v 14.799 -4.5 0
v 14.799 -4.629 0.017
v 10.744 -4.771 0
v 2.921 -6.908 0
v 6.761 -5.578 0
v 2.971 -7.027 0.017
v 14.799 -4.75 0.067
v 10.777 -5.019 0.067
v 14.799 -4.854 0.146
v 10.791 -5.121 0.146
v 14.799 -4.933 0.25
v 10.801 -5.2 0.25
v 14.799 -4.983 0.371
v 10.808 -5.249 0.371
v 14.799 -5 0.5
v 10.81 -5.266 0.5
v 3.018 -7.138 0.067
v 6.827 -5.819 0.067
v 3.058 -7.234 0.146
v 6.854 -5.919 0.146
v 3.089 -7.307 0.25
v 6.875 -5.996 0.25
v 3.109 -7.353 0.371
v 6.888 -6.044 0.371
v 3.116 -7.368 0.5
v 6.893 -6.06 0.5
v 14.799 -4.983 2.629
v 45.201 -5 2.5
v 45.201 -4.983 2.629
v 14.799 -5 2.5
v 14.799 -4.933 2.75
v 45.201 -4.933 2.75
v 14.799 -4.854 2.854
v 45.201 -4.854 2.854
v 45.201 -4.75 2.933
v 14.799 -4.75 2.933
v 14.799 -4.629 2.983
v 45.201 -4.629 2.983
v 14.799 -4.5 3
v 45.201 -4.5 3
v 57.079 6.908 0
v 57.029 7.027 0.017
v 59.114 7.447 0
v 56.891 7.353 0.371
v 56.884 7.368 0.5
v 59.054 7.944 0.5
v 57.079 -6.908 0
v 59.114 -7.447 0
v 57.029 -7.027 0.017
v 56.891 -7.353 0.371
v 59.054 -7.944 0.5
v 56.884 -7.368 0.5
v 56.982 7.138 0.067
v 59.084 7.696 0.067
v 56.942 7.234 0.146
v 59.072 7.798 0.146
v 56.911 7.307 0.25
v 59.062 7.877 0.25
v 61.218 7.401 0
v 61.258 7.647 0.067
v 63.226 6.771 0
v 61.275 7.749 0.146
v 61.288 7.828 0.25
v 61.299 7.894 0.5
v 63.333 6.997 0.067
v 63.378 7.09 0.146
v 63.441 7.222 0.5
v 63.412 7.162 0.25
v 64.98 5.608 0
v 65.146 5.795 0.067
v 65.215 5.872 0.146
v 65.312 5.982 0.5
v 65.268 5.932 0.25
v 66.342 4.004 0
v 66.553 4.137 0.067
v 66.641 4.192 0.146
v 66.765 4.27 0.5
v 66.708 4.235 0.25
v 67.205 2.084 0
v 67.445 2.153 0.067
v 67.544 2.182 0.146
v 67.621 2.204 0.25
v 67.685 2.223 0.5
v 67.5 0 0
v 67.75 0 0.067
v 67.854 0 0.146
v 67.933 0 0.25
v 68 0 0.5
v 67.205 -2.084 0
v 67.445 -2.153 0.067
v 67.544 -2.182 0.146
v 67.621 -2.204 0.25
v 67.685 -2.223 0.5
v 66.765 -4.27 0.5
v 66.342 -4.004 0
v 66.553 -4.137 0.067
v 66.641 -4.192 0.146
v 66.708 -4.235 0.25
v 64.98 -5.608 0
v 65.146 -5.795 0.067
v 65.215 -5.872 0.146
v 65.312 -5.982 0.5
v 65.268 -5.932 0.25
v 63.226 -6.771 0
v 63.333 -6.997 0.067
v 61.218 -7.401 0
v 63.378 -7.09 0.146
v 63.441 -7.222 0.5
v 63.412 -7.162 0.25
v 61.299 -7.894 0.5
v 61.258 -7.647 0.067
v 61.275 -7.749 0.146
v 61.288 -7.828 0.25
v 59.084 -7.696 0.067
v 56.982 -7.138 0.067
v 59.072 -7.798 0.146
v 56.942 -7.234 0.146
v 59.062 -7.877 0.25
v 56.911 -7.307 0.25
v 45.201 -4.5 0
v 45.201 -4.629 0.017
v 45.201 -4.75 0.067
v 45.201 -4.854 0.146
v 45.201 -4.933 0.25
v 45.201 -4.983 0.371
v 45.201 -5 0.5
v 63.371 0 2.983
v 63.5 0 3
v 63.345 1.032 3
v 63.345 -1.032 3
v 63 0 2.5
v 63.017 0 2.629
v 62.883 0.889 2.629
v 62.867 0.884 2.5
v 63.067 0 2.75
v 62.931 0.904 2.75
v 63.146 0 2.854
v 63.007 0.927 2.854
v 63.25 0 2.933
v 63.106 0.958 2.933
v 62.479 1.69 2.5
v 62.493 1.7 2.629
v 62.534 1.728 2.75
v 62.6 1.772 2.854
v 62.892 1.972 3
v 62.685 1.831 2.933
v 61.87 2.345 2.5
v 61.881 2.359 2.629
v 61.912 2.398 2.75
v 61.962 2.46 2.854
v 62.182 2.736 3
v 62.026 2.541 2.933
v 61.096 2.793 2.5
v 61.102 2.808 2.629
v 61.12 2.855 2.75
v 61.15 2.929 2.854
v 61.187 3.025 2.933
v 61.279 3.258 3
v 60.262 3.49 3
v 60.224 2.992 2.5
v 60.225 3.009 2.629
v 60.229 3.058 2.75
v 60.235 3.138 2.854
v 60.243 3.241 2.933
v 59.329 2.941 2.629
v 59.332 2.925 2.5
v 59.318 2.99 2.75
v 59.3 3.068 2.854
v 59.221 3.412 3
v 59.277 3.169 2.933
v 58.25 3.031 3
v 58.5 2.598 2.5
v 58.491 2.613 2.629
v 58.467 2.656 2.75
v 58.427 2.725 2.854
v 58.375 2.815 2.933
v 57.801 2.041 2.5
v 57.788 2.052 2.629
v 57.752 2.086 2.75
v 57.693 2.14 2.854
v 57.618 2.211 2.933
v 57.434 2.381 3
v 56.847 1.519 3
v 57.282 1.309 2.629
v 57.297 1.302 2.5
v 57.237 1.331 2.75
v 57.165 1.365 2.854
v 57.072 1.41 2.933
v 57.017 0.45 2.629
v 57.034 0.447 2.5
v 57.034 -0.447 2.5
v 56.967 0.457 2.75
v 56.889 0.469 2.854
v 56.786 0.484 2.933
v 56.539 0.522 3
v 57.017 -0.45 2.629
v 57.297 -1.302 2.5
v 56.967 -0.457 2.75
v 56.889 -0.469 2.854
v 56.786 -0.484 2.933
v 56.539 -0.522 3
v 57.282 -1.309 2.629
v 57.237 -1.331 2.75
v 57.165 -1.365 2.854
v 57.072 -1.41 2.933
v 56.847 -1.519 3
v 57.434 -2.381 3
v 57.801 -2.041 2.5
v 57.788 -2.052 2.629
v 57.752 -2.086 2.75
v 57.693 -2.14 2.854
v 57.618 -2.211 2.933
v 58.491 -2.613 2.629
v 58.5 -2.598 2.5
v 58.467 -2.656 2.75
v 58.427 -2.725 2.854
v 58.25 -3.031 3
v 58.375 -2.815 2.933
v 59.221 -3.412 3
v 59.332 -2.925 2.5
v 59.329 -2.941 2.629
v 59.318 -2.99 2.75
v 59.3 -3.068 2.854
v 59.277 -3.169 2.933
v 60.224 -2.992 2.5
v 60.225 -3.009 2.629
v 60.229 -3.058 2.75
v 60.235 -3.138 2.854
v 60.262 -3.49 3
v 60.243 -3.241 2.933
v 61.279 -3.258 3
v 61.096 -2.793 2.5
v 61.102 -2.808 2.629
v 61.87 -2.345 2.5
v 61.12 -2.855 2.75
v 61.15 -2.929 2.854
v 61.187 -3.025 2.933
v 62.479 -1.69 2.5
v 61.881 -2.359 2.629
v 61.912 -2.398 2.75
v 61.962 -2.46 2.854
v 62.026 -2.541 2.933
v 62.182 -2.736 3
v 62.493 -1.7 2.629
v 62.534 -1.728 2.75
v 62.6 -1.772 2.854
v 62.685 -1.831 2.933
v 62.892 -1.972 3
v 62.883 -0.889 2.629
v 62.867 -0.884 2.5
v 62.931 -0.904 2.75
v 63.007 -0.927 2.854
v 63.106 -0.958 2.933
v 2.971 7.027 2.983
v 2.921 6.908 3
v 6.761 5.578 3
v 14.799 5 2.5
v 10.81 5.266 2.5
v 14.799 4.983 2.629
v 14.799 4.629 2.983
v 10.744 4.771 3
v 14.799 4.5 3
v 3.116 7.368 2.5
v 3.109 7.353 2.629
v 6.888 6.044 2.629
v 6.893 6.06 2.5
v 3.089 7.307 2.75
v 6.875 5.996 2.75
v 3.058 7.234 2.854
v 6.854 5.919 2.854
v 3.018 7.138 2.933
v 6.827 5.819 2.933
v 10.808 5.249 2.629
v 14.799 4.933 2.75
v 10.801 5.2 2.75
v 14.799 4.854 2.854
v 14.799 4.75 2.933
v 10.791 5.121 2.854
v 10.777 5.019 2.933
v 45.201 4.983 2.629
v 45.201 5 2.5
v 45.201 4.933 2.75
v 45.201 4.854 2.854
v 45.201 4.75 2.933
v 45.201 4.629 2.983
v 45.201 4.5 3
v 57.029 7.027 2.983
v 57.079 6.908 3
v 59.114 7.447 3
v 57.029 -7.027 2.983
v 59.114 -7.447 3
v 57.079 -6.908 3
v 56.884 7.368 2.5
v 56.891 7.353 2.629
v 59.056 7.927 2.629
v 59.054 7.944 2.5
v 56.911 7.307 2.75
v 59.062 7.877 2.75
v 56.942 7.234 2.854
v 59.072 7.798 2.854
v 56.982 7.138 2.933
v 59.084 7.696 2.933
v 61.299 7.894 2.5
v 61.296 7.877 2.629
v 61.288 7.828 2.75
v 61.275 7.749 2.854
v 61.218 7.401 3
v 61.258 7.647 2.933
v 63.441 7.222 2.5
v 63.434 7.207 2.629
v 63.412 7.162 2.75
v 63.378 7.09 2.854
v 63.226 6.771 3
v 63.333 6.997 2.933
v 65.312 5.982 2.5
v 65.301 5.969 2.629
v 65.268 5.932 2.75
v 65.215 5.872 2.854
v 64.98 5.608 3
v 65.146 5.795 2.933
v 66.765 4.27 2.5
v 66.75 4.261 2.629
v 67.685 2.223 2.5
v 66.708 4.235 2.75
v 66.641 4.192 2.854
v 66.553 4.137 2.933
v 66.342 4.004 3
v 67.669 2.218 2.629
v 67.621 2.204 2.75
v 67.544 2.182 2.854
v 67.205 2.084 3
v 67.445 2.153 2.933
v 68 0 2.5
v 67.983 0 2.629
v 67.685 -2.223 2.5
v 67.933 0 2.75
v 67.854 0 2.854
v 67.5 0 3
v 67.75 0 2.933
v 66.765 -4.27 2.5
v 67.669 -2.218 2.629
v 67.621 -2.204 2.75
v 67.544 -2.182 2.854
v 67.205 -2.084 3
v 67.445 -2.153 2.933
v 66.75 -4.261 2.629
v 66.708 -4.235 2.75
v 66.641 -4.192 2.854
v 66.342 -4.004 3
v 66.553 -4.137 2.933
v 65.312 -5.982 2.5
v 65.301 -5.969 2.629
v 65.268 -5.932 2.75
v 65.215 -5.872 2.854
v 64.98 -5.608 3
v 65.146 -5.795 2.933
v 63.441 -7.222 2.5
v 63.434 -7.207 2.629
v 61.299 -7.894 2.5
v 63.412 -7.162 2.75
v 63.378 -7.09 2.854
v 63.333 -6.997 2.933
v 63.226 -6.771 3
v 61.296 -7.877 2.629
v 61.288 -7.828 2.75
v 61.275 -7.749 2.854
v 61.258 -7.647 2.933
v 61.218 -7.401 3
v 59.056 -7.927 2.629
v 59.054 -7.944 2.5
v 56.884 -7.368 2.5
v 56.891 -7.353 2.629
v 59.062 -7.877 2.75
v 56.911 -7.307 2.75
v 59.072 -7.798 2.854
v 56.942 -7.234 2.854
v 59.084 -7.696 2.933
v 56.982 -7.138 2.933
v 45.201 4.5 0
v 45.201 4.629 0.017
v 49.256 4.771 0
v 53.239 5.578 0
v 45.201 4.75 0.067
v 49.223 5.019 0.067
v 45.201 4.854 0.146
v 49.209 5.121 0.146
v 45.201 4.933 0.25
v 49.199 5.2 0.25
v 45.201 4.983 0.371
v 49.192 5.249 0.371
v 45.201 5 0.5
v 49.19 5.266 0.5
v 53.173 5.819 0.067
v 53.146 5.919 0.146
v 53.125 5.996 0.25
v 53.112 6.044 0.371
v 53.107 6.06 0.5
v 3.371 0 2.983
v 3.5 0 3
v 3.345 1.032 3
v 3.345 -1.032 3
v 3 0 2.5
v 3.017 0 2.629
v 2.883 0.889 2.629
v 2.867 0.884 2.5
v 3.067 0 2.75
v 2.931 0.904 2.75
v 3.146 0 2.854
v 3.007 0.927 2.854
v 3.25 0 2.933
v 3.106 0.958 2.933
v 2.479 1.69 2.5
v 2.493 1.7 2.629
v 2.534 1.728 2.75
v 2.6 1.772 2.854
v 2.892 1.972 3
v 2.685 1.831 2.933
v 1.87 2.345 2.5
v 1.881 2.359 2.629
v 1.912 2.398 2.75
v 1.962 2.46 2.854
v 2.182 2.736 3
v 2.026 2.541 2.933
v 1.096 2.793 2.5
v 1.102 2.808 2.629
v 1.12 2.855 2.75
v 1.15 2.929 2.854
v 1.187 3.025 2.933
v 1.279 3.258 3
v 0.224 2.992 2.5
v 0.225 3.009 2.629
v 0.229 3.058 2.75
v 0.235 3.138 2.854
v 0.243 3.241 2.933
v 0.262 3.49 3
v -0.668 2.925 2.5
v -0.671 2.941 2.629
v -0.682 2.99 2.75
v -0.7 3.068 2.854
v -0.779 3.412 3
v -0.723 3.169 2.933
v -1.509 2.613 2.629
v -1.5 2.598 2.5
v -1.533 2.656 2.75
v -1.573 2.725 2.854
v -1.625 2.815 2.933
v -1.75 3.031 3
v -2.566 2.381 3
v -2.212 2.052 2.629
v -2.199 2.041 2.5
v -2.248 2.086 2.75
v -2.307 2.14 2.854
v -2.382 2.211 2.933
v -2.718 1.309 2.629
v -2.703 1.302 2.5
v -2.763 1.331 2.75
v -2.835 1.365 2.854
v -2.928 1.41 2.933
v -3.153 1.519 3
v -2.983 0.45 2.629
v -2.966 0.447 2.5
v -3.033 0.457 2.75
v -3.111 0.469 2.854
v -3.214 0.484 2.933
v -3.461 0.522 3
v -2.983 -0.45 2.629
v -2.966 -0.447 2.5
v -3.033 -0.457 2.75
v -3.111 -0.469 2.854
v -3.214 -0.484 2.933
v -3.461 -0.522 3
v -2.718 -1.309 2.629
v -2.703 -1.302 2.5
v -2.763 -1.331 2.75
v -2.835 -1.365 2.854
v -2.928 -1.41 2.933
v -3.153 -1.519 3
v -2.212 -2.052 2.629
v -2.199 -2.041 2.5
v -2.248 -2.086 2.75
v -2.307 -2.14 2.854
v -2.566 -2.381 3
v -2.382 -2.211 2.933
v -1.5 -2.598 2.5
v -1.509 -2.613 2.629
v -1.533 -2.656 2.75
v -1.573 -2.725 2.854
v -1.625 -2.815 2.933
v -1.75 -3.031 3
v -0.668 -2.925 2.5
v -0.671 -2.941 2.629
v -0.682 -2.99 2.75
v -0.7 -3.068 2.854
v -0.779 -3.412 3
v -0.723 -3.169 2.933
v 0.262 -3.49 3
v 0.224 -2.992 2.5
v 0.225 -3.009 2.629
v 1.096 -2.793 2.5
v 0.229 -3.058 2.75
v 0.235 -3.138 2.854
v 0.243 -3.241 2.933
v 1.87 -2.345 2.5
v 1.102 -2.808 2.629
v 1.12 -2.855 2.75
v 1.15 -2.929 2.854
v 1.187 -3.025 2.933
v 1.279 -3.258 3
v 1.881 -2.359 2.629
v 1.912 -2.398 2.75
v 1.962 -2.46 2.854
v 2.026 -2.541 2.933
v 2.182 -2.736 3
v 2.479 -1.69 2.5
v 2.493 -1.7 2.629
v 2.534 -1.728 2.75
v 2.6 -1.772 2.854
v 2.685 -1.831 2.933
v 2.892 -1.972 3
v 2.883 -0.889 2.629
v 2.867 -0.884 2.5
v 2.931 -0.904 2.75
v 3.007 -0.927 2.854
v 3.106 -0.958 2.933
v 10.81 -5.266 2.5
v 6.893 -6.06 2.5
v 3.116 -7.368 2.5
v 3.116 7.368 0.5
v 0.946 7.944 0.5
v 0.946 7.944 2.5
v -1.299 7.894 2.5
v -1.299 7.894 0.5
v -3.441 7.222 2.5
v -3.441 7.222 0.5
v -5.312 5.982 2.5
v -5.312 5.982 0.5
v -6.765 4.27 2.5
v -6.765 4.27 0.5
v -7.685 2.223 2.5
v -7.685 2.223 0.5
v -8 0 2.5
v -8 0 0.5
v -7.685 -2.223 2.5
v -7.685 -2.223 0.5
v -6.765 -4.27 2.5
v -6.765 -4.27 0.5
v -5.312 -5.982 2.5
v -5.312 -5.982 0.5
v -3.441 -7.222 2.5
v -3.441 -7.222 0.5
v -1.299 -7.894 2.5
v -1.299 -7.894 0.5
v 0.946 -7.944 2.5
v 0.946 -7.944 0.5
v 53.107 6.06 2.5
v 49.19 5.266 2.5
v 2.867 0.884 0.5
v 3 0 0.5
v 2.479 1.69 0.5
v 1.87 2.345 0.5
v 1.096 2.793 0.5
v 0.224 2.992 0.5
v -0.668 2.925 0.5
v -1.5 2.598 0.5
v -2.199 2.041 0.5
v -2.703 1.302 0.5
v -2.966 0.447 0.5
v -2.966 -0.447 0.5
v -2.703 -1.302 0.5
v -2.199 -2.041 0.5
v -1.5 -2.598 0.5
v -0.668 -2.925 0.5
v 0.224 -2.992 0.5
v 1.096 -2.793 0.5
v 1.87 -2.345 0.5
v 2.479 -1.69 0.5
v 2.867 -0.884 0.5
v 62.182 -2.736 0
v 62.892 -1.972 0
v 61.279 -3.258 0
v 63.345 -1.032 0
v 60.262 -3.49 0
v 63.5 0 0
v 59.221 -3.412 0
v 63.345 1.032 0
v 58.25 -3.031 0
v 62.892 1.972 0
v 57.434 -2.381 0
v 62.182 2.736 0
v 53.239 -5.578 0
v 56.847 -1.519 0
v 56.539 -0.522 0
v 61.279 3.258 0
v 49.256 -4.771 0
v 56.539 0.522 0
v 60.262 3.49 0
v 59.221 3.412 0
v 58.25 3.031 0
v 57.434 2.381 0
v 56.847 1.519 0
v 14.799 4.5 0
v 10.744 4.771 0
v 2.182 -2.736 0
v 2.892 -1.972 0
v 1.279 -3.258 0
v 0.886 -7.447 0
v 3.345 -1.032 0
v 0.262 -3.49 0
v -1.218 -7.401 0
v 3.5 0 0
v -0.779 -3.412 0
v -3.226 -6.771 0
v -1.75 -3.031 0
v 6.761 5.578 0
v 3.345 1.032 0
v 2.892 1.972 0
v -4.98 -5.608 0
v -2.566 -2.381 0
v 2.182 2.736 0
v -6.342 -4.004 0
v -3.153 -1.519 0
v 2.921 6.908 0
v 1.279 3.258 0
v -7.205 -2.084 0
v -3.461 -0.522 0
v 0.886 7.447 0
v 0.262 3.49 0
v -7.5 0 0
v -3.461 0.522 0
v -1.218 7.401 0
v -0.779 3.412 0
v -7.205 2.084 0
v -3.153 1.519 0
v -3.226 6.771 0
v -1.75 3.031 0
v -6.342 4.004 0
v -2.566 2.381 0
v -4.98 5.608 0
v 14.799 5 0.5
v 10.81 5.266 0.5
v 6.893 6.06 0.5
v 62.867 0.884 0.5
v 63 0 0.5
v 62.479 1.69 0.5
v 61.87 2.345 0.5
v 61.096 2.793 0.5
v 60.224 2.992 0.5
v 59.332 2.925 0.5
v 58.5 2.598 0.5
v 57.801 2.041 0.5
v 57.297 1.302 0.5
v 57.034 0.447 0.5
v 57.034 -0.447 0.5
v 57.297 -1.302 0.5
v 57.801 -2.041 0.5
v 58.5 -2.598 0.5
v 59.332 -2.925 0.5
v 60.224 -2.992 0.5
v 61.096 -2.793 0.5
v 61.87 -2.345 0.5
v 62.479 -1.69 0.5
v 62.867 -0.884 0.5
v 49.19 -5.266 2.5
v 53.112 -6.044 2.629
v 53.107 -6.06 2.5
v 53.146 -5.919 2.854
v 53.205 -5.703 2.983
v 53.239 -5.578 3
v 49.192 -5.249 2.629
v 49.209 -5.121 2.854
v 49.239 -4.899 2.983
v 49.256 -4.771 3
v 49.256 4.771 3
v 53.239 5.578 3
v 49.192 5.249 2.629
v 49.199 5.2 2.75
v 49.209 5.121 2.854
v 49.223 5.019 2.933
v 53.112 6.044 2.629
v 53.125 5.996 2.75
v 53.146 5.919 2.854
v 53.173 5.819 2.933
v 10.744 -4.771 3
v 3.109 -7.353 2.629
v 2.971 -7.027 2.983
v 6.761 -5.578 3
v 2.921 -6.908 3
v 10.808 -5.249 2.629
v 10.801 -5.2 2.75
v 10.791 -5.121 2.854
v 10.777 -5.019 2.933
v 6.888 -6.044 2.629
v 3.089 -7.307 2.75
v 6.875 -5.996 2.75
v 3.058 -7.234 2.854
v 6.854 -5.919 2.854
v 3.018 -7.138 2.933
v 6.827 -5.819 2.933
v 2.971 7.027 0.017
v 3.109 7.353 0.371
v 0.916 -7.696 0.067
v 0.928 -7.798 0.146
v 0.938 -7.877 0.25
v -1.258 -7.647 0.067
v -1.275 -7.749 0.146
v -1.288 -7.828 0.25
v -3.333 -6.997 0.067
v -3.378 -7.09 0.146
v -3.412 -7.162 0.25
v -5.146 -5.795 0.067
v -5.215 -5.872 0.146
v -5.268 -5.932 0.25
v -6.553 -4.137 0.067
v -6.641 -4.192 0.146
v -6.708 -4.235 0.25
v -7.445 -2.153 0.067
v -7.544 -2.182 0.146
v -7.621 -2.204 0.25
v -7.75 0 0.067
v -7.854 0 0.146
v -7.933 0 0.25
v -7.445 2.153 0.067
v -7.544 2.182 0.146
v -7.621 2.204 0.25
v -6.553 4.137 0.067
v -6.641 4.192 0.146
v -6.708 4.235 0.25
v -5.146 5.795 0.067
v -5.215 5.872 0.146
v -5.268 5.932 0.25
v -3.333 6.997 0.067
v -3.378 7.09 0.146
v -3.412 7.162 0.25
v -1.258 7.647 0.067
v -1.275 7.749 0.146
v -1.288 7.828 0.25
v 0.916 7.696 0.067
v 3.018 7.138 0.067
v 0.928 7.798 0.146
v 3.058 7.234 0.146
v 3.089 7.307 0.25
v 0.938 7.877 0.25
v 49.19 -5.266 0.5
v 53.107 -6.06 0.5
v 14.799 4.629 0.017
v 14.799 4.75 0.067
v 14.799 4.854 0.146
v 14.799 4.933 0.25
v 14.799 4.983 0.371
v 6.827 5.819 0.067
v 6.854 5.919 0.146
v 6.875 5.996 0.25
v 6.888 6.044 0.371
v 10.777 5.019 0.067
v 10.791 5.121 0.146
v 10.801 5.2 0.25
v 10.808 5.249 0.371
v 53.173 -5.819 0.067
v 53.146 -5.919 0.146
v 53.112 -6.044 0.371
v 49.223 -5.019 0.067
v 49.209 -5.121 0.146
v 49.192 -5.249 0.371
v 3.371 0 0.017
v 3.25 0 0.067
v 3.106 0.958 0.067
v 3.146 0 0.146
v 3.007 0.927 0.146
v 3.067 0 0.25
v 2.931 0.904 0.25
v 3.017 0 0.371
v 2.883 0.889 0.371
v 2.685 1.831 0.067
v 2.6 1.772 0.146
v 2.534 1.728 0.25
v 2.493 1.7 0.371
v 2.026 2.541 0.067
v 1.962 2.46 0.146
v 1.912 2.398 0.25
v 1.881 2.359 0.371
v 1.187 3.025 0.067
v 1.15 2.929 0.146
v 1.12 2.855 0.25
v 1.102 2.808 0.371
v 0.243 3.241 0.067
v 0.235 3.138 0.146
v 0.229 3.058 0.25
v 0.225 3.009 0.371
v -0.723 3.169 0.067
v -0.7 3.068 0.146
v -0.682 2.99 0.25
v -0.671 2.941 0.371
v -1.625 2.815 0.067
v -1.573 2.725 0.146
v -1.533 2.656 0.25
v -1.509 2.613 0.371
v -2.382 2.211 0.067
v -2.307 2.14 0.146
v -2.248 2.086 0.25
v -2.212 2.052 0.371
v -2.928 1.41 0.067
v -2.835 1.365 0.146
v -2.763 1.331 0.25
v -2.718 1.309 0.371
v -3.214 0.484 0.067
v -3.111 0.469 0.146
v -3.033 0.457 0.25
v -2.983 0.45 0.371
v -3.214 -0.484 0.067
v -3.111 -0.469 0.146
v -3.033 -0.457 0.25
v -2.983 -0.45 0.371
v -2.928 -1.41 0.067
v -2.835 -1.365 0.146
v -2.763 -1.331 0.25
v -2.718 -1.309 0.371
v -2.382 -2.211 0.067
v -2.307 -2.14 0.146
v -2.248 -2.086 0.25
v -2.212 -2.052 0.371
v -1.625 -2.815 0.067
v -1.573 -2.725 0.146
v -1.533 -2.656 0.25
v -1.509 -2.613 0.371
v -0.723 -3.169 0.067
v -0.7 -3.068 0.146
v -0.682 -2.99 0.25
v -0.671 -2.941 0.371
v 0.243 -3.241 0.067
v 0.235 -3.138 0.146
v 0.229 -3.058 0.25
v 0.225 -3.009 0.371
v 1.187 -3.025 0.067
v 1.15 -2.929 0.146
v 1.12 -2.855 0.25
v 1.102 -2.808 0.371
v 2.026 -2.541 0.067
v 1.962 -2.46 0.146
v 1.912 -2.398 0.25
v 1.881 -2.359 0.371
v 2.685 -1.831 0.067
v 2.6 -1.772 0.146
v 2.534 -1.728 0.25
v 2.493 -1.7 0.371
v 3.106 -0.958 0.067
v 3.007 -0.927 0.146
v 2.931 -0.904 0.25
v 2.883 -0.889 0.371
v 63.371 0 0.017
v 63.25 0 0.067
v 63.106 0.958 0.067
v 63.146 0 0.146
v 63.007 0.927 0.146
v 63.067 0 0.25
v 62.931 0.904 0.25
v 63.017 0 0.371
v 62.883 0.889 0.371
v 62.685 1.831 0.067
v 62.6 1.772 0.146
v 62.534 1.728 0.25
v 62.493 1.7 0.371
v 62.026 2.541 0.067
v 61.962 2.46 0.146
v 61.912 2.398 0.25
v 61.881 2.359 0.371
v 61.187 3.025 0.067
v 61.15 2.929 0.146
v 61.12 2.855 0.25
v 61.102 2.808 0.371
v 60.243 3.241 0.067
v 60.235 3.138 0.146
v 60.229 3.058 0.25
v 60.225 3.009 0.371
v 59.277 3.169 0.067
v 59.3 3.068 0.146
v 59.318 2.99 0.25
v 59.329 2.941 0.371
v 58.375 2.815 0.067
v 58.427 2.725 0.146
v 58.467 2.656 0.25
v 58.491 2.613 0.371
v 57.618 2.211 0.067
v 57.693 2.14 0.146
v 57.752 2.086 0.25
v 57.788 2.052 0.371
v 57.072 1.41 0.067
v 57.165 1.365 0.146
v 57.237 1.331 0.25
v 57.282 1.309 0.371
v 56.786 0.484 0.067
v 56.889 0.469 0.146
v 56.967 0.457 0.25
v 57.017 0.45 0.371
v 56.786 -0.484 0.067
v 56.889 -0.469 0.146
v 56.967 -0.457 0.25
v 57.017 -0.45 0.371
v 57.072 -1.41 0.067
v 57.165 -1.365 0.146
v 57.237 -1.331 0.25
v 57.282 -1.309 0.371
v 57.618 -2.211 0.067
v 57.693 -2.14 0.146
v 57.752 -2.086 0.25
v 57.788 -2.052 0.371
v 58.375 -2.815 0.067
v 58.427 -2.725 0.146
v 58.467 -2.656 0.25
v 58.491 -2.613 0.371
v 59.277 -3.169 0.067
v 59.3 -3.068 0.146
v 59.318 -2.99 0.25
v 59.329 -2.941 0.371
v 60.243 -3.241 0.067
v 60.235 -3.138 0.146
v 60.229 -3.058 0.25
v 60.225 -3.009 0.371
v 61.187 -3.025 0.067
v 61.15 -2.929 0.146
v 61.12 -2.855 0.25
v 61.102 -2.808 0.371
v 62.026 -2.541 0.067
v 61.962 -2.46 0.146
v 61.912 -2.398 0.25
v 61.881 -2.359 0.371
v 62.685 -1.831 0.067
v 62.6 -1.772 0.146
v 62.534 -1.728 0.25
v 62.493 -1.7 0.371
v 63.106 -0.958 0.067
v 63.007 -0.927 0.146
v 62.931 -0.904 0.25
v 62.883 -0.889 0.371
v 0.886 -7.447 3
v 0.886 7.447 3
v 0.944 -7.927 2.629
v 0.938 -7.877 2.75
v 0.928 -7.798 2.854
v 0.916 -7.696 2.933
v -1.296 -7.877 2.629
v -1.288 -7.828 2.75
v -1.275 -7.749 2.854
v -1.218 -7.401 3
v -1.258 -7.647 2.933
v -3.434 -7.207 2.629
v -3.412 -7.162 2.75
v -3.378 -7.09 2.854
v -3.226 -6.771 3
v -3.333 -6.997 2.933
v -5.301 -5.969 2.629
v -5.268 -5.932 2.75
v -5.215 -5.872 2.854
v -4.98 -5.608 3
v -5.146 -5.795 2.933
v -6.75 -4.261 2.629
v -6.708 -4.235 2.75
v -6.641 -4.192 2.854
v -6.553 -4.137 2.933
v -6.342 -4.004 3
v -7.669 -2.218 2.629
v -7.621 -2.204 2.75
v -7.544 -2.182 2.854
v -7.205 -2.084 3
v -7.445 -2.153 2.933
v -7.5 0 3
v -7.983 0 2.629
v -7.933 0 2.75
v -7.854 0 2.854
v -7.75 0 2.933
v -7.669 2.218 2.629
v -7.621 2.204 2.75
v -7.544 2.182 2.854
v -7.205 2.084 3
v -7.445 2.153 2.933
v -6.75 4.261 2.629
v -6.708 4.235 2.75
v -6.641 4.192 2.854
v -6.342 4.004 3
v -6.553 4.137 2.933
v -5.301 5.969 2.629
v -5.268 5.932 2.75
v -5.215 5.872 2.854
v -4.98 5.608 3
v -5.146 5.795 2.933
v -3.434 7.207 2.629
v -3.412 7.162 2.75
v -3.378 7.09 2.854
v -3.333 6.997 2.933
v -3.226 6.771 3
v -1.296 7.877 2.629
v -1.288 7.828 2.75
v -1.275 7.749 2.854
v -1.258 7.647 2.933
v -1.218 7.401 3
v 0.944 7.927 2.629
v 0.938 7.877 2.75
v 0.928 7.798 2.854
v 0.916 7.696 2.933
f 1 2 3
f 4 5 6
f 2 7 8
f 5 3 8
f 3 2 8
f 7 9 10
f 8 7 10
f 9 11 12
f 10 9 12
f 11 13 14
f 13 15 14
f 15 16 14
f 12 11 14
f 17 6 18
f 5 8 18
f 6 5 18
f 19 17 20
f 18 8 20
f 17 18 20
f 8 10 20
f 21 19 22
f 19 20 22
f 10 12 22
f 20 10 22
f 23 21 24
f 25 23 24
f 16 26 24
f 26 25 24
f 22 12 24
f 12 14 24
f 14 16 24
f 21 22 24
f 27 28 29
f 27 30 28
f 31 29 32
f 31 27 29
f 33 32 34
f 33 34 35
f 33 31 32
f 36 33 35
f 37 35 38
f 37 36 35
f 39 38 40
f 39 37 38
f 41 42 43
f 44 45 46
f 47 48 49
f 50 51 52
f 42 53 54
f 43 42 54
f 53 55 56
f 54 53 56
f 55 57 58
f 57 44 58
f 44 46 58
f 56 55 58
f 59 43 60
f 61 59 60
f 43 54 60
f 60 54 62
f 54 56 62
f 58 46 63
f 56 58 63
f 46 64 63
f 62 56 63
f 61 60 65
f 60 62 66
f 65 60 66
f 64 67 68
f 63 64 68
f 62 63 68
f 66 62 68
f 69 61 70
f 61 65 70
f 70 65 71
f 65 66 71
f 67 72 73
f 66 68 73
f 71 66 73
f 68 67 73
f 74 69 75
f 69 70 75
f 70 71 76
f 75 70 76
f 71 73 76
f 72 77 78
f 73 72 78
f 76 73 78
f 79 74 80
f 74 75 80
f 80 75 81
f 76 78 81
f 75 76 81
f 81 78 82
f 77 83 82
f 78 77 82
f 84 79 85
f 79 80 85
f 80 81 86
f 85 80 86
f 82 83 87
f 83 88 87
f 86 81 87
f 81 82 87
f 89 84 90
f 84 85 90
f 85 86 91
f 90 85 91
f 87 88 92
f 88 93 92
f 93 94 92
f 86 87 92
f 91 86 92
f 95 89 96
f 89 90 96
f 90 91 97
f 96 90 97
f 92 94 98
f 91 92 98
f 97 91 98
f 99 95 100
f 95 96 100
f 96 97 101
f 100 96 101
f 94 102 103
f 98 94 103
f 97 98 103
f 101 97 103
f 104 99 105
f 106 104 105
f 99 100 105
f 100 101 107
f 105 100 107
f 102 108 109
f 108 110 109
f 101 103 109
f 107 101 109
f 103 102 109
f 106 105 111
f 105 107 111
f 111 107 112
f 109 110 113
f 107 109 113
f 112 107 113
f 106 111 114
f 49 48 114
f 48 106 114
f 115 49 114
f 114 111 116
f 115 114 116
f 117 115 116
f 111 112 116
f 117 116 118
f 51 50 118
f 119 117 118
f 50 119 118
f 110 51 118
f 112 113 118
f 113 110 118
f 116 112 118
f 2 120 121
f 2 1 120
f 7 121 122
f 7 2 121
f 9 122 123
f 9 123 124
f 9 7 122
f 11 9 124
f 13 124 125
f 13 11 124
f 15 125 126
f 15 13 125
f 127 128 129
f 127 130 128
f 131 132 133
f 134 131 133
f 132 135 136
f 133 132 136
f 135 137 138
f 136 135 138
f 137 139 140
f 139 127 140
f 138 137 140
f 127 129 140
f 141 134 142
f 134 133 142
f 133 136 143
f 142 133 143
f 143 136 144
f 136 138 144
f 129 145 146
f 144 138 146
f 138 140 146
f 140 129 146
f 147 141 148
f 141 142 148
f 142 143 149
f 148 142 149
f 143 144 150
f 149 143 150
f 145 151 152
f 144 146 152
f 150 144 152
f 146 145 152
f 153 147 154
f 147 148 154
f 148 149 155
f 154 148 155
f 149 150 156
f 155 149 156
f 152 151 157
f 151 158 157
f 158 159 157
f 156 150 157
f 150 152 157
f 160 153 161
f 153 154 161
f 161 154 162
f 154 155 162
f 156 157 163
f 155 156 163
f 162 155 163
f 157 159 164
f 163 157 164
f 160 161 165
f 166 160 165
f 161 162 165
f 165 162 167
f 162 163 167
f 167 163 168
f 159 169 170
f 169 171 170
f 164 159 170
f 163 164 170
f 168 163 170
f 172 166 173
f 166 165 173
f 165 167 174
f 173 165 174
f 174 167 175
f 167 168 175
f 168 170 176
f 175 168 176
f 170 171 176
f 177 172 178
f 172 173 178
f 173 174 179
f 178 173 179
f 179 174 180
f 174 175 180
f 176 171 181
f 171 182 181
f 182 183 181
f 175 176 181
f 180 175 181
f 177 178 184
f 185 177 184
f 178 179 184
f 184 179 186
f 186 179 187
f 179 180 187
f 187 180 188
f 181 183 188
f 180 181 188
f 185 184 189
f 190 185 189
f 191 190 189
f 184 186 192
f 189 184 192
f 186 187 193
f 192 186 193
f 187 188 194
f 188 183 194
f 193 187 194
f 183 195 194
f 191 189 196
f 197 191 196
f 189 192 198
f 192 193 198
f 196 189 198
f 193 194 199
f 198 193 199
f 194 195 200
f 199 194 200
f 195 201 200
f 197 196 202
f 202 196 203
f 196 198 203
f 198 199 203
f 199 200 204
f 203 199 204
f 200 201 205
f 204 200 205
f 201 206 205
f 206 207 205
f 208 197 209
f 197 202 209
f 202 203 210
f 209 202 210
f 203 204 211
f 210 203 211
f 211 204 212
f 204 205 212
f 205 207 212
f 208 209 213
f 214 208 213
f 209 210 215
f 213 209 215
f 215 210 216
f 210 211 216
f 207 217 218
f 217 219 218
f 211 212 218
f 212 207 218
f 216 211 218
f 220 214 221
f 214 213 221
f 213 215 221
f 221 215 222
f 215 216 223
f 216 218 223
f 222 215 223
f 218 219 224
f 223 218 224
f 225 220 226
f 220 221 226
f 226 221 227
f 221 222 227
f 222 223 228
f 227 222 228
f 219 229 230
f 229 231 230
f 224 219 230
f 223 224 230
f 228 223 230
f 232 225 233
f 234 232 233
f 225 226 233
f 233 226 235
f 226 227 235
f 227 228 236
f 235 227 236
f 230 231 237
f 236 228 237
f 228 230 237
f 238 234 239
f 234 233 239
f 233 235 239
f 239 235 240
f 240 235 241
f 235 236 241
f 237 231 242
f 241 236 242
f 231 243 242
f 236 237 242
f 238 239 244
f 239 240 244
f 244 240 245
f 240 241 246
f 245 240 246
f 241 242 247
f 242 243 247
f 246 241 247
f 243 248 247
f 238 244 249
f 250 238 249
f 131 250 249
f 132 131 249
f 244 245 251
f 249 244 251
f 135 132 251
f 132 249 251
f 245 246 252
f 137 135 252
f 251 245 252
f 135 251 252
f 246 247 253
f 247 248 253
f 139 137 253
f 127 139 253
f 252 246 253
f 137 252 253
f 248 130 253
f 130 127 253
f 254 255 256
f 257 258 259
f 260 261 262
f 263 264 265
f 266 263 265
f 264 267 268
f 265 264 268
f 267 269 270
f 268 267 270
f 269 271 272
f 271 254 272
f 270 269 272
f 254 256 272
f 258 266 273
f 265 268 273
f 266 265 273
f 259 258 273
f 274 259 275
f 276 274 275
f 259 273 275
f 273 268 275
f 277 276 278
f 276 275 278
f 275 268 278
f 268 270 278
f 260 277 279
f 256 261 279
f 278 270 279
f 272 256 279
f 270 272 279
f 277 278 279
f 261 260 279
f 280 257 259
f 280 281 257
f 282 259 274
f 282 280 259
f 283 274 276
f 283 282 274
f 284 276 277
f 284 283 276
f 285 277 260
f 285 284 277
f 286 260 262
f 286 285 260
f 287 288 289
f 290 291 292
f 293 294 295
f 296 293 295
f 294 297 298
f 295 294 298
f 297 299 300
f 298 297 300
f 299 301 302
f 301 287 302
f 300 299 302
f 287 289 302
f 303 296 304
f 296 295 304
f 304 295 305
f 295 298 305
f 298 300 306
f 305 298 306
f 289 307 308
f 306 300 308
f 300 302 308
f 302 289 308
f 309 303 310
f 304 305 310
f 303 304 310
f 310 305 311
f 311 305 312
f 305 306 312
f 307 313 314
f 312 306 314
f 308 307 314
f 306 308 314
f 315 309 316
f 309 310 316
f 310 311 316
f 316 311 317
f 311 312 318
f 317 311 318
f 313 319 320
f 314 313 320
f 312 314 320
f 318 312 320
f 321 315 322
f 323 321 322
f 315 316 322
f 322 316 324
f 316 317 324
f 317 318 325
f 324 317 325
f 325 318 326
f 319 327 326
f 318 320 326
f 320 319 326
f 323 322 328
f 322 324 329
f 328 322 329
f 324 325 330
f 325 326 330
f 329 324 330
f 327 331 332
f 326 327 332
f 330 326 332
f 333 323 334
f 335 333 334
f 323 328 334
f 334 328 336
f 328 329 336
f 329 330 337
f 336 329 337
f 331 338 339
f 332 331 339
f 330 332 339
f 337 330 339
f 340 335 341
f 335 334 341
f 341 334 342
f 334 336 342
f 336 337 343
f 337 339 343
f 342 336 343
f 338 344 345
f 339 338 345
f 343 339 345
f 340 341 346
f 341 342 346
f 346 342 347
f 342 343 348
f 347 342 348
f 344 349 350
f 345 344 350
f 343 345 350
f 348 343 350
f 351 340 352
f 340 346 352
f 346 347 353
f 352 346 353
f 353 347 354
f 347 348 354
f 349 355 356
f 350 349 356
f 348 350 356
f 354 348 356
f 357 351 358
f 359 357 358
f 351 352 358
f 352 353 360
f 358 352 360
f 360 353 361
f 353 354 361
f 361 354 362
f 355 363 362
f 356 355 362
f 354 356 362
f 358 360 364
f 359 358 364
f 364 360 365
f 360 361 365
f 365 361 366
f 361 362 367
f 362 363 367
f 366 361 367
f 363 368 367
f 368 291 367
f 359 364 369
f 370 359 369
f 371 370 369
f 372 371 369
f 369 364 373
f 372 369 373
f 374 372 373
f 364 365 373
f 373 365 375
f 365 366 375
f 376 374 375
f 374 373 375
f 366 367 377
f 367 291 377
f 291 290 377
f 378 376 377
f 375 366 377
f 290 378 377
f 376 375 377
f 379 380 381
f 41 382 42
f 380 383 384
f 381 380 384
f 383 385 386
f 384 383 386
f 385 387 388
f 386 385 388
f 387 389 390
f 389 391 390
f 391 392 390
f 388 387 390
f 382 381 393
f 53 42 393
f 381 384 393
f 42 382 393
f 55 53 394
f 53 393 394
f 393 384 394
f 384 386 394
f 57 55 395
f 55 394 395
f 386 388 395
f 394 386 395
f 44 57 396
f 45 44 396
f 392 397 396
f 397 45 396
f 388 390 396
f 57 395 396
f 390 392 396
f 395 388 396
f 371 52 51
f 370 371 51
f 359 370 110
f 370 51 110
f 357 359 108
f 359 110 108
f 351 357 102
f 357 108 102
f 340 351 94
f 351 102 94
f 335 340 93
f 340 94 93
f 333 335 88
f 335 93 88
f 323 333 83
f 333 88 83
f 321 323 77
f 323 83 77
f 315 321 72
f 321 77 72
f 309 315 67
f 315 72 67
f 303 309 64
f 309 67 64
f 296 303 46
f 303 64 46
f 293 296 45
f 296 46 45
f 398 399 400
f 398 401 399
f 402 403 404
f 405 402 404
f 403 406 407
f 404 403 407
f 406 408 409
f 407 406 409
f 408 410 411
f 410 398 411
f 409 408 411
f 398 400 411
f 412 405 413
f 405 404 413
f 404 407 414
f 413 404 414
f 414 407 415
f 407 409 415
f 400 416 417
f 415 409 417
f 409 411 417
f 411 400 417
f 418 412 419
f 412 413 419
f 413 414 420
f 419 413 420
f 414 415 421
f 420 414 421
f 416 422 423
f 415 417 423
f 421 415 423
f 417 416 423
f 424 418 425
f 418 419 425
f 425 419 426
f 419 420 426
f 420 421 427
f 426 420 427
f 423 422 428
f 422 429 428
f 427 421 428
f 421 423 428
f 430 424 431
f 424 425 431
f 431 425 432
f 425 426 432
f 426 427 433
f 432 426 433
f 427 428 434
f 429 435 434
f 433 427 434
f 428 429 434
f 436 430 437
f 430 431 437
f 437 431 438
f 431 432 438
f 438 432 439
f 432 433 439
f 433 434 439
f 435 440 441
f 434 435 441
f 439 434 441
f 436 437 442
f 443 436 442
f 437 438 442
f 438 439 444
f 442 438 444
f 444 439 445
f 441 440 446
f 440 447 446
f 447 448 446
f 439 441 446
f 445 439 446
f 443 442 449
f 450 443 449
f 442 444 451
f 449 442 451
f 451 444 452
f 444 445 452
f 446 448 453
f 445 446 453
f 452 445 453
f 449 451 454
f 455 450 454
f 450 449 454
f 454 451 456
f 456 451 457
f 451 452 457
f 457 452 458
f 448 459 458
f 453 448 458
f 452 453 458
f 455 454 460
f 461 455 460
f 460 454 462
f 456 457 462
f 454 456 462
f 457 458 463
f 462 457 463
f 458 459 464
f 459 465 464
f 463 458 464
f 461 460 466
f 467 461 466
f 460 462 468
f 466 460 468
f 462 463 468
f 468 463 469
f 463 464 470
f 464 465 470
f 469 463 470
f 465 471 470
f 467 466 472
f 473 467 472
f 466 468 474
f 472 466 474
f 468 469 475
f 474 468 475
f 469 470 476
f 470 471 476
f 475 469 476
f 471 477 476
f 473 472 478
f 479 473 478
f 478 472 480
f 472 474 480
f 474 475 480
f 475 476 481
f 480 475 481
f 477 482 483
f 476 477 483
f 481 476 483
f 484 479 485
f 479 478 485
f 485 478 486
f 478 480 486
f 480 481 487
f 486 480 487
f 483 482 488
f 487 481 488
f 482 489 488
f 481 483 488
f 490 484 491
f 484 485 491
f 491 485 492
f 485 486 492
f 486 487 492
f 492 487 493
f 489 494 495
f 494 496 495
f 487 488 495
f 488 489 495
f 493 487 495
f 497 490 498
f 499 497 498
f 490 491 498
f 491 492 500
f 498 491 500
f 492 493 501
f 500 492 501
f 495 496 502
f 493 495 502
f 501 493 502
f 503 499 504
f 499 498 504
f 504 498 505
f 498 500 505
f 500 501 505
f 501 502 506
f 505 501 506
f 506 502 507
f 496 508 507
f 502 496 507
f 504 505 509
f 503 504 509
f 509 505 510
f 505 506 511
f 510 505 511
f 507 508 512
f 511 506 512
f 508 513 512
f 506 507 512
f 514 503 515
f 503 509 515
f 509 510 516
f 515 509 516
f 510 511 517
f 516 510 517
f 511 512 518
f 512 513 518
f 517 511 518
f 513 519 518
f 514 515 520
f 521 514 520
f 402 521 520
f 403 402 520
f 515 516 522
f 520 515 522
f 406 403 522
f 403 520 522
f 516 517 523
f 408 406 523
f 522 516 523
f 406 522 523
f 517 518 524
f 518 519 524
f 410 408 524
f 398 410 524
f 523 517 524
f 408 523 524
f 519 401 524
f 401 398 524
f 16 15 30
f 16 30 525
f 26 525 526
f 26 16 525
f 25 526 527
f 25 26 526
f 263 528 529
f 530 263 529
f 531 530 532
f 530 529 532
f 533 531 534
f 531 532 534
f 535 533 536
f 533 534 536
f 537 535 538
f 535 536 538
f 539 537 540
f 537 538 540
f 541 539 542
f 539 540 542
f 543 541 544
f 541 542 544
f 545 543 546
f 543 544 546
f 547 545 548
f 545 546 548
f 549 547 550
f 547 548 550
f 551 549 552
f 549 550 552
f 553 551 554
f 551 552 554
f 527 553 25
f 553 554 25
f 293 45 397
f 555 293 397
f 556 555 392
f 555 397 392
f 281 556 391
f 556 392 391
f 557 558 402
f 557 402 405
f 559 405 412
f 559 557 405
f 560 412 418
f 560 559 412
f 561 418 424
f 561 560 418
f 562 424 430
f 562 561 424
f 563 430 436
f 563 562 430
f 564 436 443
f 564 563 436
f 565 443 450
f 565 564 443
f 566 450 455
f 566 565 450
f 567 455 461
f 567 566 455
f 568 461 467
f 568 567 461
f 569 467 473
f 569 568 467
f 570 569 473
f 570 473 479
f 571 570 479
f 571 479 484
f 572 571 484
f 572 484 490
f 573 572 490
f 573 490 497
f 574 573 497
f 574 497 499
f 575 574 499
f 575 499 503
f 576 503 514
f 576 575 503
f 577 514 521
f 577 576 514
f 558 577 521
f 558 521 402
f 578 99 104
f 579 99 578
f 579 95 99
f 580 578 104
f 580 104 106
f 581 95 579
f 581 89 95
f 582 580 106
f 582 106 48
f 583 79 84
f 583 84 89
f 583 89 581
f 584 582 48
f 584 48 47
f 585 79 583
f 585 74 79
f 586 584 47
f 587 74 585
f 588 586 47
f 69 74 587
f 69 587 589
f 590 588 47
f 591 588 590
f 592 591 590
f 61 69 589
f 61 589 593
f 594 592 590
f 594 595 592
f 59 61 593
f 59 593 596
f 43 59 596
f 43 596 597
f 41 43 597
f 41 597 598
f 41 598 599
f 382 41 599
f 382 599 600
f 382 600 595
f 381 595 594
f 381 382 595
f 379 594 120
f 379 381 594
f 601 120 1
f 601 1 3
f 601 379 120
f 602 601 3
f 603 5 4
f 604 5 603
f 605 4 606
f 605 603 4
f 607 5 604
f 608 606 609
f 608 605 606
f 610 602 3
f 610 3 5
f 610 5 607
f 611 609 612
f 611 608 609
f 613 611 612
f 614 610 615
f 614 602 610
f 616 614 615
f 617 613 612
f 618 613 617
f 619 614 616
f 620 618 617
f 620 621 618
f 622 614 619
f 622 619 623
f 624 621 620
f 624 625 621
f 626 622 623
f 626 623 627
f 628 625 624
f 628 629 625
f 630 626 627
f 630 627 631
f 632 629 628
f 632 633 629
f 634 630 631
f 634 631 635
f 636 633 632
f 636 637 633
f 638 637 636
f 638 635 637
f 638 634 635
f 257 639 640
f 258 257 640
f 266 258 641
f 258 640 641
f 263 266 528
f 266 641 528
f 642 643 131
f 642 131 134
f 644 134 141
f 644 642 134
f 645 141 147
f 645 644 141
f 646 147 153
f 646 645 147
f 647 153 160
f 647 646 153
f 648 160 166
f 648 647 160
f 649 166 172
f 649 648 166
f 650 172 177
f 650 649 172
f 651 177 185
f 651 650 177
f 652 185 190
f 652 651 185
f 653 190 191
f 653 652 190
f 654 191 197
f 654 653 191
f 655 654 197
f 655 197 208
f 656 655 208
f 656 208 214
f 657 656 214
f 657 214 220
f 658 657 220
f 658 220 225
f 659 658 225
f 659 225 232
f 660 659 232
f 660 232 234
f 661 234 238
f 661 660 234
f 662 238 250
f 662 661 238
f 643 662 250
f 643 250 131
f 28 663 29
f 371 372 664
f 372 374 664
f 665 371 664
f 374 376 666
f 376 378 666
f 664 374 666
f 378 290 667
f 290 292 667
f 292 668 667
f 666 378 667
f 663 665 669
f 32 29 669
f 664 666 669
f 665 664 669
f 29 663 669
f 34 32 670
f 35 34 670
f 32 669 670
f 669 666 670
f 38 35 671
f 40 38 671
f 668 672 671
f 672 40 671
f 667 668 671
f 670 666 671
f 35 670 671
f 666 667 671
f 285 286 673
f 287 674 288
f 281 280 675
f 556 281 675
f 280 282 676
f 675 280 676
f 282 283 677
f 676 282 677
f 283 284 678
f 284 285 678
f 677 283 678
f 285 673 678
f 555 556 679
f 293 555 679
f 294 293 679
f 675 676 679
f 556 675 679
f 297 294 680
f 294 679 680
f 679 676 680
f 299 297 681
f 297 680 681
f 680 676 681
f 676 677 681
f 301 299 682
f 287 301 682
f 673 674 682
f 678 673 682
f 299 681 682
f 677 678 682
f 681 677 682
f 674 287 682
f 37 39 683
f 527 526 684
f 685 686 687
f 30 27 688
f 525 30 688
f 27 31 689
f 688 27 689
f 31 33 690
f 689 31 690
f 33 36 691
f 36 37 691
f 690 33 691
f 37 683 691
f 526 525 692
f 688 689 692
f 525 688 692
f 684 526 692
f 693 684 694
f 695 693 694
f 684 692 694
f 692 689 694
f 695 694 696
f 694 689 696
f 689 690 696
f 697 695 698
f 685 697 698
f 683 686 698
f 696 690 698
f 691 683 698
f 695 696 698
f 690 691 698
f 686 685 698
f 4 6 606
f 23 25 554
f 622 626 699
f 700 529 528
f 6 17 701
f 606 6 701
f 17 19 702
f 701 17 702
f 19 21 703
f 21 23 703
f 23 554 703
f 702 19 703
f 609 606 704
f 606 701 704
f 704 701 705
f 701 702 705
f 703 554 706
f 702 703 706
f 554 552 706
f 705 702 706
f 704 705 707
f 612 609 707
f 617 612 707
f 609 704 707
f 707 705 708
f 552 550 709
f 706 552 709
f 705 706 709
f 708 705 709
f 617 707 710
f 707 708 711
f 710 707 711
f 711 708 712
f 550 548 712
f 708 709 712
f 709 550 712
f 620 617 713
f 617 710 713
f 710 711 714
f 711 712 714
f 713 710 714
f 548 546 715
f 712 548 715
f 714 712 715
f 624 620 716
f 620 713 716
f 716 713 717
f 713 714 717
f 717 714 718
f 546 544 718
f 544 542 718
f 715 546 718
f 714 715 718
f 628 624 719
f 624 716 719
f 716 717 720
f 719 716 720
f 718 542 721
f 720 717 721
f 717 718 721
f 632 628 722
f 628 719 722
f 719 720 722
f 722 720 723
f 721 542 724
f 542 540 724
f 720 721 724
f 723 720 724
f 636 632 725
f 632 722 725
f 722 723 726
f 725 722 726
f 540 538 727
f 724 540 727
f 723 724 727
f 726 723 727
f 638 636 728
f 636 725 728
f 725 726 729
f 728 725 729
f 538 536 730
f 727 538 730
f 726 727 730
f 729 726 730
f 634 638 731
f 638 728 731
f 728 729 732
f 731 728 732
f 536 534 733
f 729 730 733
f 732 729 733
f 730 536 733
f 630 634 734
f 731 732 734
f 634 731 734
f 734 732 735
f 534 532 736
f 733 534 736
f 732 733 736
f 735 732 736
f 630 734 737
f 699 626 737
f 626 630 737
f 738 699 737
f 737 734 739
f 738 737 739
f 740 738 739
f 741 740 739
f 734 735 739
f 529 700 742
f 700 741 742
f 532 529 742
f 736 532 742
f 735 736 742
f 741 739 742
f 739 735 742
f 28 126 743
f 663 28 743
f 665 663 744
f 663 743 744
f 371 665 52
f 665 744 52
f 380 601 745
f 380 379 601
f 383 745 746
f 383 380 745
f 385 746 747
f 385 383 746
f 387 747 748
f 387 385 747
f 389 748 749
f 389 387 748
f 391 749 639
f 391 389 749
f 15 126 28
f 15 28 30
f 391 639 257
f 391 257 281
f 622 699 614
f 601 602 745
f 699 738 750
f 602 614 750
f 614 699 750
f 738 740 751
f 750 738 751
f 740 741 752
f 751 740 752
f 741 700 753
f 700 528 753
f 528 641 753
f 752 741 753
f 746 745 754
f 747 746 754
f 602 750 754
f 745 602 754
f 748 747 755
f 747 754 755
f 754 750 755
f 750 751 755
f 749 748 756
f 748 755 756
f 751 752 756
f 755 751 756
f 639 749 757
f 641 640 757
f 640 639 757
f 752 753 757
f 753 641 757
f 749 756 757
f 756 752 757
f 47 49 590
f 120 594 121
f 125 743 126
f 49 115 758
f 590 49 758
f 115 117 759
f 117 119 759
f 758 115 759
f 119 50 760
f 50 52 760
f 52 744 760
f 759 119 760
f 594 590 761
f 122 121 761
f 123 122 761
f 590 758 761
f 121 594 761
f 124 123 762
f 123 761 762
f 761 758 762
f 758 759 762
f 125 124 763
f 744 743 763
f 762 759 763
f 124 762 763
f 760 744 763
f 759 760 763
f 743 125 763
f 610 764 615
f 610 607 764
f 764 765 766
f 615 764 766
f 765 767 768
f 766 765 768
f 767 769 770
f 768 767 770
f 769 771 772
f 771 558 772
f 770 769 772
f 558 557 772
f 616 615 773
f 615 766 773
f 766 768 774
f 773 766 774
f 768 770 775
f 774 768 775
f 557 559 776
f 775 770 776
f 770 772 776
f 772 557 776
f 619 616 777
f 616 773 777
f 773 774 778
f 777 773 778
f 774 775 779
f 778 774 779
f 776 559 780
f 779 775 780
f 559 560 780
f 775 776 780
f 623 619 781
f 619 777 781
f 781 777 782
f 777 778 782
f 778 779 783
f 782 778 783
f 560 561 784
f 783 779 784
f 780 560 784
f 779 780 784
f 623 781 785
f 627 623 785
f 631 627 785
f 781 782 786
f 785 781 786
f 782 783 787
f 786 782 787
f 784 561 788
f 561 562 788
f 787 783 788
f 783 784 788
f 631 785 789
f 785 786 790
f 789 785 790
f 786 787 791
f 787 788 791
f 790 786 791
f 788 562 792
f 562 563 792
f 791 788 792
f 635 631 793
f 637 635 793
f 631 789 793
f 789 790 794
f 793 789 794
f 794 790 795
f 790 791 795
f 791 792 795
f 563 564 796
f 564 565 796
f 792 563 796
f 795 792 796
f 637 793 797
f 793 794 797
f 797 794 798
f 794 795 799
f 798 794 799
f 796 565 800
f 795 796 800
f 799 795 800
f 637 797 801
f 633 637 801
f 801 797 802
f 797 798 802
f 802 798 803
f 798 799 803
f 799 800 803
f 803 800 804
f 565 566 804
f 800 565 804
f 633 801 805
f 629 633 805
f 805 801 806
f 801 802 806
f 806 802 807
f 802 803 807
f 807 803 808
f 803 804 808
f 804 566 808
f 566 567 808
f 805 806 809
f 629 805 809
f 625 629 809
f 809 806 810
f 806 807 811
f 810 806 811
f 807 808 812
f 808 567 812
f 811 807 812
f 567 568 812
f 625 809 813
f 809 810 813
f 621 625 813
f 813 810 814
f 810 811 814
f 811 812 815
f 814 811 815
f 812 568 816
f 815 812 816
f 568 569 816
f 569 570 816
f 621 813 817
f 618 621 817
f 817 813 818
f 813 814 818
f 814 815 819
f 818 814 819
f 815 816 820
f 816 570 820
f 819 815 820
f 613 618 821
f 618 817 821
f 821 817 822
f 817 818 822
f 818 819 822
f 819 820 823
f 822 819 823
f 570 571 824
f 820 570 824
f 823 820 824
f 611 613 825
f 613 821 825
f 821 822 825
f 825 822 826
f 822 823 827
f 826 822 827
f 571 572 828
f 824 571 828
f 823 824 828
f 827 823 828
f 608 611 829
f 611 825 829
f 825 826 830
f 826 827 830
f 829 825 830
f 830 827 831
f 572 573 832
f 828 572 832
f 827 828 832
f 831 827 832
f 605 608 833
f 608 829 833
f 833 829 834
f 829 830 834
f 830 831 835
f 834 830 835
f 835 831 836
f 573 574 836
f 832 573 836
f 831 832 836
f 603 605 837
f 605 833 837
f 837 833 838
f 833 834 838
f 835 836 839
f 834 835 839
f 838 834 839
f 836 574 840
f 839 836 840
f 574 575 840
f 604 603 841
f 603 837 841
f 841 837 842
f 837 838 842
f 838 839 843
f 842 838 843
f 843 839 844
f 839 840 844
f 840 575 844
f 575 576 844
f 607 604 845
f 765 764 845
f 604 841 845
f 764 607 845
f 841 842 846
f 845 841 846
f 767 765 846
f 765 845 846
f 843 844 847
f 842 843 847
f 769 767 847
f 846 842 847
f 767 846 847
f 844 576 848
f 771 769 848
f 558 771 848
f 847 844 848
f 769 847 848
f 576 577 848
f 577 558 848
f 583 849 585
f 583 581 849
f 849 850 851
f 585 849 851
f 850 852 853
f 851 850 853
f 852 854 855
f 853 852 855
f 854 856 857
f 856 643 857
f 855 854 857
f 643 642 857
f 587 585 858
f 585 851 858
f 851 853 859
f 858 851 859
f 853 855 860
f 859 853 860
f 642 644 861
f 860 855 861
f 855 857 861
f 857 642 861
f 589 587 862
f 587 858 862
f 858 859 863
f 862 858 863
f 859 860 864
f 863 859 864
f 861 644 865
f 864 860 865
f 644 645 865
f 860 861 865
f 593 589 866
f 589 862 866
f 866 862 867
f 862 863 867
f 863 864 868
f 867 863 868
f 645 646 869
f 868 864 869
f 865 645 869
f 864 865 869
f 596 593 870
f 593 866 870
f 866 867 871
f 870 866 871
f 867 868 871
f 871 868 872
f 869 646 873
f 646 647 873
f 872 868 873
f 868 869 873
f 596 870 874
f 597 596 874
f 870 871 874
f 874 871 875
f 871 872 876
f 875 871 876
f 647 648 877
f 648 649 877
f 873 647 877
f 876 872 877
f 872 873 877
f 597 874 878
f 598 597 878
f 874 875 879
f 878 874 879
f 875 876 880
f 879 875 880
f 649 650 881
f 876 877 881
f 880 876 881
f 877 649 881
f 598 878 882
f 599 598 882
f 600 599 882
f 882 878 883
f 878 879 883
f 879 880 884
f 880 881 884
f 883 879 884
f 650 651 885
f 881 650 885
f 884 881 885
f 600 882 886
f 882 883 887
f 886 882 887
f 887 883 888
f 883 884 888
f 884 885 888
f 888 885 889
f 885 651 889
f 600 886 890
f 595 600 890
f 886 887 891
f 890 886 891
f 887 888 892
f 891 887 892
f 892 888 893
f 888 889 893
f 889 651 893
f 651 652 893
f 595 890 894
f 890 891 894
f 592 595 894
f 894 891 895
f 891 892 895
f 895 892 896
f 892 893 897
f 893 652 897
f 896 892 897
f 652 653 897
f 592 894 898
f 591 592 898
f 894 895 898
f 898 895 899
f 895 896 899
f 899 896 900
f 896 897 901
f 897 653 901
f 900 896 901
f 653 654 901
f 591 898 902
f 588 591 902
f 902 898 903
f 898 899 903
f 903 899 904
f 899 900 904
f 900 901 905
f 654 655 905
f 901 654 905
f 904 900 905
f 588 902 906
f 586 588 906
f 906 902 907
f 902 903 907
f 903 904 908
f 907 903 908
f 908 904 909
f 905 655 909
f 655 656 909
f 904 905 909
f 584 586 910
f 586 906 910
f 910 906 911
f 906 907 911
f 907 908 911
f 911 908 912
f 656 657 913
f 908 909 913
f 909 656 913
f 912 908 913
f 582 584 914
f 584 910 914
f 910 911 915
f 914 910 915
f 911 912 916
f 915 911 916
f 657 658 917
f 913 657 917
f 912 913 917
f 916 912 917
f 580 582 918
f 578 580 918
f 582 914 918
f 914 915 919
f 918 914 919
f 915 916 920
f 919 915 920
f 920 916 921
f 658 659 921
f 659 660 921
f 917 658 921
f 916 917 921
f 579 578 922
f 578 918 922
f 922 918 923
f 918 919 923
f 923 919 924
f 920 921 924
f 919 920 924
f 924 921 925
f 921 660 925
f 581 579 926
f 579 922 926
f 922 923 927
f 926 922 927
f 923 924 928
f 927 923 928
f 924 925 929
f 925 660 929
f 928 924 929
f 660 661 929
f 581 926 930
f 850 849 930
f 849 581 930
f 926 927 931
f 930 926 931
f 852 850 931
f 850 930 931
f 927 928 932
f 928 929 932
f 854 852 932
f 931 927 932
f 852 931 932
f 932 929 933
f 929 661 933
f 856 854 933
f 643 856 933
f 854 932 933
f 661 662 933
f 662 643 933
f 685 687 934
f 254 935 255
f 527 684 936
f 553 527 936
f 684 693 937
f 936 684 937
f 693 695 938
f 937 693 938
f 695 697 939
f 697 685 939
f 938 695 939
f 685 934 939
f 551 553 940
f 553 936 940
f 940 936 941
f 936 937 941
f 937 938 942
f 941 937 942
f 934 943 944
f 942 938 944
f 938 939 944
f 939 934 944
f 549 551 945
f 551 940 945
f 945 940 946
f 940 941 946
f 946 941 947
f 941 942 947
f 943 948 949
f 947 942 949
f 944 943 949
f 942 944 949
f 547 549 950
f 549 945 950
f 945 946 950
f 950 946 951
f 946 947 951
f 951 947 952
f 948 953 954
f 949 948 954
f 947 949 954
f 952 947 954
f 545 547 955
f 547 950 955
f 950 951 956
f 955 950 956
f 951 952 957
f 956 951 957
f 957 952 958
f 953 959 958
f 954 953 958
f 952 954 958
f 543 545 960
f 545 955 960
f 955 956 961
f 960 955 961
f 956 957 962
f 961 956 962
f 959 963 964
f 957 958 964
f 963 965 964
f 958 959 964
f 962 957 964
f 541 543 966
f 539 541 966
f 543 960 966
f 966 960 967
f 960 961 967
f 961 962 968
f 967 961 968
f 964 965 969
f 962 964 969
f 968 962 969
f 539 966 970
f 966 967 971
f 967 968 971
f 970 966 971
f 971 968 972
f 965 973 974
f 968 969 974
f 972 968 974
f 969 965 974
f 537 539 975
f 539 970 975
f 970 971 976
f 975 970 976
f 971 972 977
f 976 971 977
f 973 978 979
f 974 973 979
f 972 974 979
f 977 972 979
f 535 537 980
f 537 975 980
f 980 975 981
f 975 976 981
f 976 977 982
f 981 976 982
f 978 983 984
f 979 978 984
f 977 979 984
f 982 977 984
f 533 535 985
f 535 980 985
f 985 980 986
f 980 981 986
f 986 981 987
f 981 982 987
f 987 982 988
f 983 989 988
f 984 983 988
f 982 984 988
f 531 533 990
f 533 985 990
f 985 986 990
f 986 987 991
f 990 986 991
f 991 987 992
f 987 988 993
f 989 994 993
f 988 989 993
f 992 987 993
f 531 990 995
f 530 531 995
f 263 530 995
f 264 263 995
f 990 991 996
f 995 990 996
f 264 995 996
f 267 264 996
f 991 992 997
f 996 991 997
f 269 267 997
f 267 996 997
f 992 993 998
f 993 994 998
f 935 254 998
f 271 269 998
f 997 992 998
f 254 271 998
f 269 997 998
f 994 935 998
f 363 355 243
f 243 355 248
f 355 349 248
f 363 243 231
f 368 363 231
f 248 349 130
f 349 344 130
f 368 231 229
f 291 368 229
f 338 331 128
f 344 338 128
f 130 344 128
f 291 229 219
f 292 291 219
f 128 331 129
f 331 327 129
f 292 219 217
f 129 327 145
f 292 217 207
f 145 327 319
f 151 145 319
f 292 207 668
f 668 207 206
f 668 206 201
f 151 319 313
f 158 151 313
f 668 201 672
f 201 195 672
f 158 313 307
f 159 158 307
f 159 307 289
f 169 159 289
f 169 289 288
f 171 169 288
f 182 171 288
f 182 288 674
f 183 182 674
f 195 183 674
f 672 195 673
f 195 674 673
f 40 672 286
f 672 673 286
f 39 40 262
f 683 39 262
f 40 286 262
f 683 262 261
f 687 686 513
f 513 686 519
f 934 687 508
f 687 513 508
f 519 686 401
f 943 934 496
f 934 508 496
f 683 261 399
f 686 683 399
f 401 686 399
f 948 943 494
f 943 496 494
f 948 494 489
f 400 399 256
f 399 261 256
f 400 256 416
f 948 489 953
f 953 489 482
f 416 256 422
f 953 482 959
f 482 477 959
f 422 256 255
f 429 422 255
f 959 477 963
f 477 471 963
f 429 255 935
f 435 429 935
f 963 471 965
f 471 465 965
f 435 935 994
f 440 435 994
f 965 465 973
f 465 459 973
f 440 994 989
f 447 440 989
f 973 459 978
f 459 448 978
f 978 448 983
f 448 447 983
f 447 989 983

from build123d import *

# Parameters (mm, degrees)
SKETCH_1_R      = 3
EXTRUDE_1_DEPTH = 3
EXTRUDE_START   = -3
SKETCH_3_R      = 8
SKETCH_3_R_2    = 3
EXTRUDE_2_DEPTH = 3
FILLET_2_R      = 30
FILLET_1_R      = 0.5


with BuildPart() as part:
    # ｽｹｯﾁ1 → ﾎﾞｽ - 押し出し1 (new body)
    with BuildSketch(Plane.XY):
        with BuildLine():
            Line((0, 5), (60, 5))
            ThreePointArc((60, 5), (65, 0), (60, -5))
            Line((60, -5), (0, -5))
            ThreePointArc((0, -5), (-5, 0), (0, 5))
        make_face()
        Circle(SKETCH_1_R, mode=Mode.SUBTRACT)
        with Locations((60, 0)):
            Circle(SKETCH_1_R, mode=Mode.SUBTRACT)
    extrude(amount=EXTRUDE_1_DEPTH)

    # ｽｹｯﾁ3 → ﾎﾞｽ - 押し出し2 (add)
    # profile 1 of 2: a face of its own
    with BuildSketch(Plane.XY.offset(3).offset(EXTRUDE_START)):
        Circle(SKETCH_3_R)
        Circle(SKETCH_3_R_2, mode=Mode.SUBTRACT)
    # profile 2 of 2: a face of its own
    with BuildSketch(Plane.XY.offset(3).offset(EXTRUDE_START)):
        with Locations((60, 0)):
            Circle(SKETCH_3_R)
        with Locations((60, 0)):
            Circle(SKETCH_3_R_2, mode=Mode.SUBTRACT)
    extrude(amount=EXTRUDE_2_DEPTH)

    # ﾌｨﾚｯﾄ2
    fillet_2_edges = [part.edges().sort_by_distance(p)[0] for p in [
        (6.244997998, 5, 1.5),
        (6.244997998, -5, 1.5),
        (53.755002002, 5, 1.5),
        (53.755002002, -5, 1.5),
    ]]
    fillet(fillet_2_edges, radius=FILLET_2_R)

    # ﾌｨﾚｯﾄ1
    fillet_1_edges = [part.edges().sort_by_distance(p)[0] for p in [
        (-3, 0, 0),
        (-3, 0, 3),
        (57, 0, 0),
        (57, 0, 3),
        (30, -5, 0),
        (30, -5, 3),
        (-8, 0, 3),
        (-8, 0, 0),
        (68, 0, 0),
        (68, 0, 3),
        (30, 5, 3),
        (30, 5, 0),
        (8.83825298, -5.598066659, 0),
        (8.83825298, -5.598066659, 3),
        (51.16174702, -5.598066659, 3),
        (51.16174702, -5.598066659, 0),
        (51.16174702, 5.598066659, 0),
        (51.16174702, 5.598066659, 3),
        (8.83825298, 5.598066659, 3),
        (8.83825298, 5.598066659, 0),
    ]]
    fillet(fillet_1_edges, radius=FILLET_1_R)


solid = part.part
